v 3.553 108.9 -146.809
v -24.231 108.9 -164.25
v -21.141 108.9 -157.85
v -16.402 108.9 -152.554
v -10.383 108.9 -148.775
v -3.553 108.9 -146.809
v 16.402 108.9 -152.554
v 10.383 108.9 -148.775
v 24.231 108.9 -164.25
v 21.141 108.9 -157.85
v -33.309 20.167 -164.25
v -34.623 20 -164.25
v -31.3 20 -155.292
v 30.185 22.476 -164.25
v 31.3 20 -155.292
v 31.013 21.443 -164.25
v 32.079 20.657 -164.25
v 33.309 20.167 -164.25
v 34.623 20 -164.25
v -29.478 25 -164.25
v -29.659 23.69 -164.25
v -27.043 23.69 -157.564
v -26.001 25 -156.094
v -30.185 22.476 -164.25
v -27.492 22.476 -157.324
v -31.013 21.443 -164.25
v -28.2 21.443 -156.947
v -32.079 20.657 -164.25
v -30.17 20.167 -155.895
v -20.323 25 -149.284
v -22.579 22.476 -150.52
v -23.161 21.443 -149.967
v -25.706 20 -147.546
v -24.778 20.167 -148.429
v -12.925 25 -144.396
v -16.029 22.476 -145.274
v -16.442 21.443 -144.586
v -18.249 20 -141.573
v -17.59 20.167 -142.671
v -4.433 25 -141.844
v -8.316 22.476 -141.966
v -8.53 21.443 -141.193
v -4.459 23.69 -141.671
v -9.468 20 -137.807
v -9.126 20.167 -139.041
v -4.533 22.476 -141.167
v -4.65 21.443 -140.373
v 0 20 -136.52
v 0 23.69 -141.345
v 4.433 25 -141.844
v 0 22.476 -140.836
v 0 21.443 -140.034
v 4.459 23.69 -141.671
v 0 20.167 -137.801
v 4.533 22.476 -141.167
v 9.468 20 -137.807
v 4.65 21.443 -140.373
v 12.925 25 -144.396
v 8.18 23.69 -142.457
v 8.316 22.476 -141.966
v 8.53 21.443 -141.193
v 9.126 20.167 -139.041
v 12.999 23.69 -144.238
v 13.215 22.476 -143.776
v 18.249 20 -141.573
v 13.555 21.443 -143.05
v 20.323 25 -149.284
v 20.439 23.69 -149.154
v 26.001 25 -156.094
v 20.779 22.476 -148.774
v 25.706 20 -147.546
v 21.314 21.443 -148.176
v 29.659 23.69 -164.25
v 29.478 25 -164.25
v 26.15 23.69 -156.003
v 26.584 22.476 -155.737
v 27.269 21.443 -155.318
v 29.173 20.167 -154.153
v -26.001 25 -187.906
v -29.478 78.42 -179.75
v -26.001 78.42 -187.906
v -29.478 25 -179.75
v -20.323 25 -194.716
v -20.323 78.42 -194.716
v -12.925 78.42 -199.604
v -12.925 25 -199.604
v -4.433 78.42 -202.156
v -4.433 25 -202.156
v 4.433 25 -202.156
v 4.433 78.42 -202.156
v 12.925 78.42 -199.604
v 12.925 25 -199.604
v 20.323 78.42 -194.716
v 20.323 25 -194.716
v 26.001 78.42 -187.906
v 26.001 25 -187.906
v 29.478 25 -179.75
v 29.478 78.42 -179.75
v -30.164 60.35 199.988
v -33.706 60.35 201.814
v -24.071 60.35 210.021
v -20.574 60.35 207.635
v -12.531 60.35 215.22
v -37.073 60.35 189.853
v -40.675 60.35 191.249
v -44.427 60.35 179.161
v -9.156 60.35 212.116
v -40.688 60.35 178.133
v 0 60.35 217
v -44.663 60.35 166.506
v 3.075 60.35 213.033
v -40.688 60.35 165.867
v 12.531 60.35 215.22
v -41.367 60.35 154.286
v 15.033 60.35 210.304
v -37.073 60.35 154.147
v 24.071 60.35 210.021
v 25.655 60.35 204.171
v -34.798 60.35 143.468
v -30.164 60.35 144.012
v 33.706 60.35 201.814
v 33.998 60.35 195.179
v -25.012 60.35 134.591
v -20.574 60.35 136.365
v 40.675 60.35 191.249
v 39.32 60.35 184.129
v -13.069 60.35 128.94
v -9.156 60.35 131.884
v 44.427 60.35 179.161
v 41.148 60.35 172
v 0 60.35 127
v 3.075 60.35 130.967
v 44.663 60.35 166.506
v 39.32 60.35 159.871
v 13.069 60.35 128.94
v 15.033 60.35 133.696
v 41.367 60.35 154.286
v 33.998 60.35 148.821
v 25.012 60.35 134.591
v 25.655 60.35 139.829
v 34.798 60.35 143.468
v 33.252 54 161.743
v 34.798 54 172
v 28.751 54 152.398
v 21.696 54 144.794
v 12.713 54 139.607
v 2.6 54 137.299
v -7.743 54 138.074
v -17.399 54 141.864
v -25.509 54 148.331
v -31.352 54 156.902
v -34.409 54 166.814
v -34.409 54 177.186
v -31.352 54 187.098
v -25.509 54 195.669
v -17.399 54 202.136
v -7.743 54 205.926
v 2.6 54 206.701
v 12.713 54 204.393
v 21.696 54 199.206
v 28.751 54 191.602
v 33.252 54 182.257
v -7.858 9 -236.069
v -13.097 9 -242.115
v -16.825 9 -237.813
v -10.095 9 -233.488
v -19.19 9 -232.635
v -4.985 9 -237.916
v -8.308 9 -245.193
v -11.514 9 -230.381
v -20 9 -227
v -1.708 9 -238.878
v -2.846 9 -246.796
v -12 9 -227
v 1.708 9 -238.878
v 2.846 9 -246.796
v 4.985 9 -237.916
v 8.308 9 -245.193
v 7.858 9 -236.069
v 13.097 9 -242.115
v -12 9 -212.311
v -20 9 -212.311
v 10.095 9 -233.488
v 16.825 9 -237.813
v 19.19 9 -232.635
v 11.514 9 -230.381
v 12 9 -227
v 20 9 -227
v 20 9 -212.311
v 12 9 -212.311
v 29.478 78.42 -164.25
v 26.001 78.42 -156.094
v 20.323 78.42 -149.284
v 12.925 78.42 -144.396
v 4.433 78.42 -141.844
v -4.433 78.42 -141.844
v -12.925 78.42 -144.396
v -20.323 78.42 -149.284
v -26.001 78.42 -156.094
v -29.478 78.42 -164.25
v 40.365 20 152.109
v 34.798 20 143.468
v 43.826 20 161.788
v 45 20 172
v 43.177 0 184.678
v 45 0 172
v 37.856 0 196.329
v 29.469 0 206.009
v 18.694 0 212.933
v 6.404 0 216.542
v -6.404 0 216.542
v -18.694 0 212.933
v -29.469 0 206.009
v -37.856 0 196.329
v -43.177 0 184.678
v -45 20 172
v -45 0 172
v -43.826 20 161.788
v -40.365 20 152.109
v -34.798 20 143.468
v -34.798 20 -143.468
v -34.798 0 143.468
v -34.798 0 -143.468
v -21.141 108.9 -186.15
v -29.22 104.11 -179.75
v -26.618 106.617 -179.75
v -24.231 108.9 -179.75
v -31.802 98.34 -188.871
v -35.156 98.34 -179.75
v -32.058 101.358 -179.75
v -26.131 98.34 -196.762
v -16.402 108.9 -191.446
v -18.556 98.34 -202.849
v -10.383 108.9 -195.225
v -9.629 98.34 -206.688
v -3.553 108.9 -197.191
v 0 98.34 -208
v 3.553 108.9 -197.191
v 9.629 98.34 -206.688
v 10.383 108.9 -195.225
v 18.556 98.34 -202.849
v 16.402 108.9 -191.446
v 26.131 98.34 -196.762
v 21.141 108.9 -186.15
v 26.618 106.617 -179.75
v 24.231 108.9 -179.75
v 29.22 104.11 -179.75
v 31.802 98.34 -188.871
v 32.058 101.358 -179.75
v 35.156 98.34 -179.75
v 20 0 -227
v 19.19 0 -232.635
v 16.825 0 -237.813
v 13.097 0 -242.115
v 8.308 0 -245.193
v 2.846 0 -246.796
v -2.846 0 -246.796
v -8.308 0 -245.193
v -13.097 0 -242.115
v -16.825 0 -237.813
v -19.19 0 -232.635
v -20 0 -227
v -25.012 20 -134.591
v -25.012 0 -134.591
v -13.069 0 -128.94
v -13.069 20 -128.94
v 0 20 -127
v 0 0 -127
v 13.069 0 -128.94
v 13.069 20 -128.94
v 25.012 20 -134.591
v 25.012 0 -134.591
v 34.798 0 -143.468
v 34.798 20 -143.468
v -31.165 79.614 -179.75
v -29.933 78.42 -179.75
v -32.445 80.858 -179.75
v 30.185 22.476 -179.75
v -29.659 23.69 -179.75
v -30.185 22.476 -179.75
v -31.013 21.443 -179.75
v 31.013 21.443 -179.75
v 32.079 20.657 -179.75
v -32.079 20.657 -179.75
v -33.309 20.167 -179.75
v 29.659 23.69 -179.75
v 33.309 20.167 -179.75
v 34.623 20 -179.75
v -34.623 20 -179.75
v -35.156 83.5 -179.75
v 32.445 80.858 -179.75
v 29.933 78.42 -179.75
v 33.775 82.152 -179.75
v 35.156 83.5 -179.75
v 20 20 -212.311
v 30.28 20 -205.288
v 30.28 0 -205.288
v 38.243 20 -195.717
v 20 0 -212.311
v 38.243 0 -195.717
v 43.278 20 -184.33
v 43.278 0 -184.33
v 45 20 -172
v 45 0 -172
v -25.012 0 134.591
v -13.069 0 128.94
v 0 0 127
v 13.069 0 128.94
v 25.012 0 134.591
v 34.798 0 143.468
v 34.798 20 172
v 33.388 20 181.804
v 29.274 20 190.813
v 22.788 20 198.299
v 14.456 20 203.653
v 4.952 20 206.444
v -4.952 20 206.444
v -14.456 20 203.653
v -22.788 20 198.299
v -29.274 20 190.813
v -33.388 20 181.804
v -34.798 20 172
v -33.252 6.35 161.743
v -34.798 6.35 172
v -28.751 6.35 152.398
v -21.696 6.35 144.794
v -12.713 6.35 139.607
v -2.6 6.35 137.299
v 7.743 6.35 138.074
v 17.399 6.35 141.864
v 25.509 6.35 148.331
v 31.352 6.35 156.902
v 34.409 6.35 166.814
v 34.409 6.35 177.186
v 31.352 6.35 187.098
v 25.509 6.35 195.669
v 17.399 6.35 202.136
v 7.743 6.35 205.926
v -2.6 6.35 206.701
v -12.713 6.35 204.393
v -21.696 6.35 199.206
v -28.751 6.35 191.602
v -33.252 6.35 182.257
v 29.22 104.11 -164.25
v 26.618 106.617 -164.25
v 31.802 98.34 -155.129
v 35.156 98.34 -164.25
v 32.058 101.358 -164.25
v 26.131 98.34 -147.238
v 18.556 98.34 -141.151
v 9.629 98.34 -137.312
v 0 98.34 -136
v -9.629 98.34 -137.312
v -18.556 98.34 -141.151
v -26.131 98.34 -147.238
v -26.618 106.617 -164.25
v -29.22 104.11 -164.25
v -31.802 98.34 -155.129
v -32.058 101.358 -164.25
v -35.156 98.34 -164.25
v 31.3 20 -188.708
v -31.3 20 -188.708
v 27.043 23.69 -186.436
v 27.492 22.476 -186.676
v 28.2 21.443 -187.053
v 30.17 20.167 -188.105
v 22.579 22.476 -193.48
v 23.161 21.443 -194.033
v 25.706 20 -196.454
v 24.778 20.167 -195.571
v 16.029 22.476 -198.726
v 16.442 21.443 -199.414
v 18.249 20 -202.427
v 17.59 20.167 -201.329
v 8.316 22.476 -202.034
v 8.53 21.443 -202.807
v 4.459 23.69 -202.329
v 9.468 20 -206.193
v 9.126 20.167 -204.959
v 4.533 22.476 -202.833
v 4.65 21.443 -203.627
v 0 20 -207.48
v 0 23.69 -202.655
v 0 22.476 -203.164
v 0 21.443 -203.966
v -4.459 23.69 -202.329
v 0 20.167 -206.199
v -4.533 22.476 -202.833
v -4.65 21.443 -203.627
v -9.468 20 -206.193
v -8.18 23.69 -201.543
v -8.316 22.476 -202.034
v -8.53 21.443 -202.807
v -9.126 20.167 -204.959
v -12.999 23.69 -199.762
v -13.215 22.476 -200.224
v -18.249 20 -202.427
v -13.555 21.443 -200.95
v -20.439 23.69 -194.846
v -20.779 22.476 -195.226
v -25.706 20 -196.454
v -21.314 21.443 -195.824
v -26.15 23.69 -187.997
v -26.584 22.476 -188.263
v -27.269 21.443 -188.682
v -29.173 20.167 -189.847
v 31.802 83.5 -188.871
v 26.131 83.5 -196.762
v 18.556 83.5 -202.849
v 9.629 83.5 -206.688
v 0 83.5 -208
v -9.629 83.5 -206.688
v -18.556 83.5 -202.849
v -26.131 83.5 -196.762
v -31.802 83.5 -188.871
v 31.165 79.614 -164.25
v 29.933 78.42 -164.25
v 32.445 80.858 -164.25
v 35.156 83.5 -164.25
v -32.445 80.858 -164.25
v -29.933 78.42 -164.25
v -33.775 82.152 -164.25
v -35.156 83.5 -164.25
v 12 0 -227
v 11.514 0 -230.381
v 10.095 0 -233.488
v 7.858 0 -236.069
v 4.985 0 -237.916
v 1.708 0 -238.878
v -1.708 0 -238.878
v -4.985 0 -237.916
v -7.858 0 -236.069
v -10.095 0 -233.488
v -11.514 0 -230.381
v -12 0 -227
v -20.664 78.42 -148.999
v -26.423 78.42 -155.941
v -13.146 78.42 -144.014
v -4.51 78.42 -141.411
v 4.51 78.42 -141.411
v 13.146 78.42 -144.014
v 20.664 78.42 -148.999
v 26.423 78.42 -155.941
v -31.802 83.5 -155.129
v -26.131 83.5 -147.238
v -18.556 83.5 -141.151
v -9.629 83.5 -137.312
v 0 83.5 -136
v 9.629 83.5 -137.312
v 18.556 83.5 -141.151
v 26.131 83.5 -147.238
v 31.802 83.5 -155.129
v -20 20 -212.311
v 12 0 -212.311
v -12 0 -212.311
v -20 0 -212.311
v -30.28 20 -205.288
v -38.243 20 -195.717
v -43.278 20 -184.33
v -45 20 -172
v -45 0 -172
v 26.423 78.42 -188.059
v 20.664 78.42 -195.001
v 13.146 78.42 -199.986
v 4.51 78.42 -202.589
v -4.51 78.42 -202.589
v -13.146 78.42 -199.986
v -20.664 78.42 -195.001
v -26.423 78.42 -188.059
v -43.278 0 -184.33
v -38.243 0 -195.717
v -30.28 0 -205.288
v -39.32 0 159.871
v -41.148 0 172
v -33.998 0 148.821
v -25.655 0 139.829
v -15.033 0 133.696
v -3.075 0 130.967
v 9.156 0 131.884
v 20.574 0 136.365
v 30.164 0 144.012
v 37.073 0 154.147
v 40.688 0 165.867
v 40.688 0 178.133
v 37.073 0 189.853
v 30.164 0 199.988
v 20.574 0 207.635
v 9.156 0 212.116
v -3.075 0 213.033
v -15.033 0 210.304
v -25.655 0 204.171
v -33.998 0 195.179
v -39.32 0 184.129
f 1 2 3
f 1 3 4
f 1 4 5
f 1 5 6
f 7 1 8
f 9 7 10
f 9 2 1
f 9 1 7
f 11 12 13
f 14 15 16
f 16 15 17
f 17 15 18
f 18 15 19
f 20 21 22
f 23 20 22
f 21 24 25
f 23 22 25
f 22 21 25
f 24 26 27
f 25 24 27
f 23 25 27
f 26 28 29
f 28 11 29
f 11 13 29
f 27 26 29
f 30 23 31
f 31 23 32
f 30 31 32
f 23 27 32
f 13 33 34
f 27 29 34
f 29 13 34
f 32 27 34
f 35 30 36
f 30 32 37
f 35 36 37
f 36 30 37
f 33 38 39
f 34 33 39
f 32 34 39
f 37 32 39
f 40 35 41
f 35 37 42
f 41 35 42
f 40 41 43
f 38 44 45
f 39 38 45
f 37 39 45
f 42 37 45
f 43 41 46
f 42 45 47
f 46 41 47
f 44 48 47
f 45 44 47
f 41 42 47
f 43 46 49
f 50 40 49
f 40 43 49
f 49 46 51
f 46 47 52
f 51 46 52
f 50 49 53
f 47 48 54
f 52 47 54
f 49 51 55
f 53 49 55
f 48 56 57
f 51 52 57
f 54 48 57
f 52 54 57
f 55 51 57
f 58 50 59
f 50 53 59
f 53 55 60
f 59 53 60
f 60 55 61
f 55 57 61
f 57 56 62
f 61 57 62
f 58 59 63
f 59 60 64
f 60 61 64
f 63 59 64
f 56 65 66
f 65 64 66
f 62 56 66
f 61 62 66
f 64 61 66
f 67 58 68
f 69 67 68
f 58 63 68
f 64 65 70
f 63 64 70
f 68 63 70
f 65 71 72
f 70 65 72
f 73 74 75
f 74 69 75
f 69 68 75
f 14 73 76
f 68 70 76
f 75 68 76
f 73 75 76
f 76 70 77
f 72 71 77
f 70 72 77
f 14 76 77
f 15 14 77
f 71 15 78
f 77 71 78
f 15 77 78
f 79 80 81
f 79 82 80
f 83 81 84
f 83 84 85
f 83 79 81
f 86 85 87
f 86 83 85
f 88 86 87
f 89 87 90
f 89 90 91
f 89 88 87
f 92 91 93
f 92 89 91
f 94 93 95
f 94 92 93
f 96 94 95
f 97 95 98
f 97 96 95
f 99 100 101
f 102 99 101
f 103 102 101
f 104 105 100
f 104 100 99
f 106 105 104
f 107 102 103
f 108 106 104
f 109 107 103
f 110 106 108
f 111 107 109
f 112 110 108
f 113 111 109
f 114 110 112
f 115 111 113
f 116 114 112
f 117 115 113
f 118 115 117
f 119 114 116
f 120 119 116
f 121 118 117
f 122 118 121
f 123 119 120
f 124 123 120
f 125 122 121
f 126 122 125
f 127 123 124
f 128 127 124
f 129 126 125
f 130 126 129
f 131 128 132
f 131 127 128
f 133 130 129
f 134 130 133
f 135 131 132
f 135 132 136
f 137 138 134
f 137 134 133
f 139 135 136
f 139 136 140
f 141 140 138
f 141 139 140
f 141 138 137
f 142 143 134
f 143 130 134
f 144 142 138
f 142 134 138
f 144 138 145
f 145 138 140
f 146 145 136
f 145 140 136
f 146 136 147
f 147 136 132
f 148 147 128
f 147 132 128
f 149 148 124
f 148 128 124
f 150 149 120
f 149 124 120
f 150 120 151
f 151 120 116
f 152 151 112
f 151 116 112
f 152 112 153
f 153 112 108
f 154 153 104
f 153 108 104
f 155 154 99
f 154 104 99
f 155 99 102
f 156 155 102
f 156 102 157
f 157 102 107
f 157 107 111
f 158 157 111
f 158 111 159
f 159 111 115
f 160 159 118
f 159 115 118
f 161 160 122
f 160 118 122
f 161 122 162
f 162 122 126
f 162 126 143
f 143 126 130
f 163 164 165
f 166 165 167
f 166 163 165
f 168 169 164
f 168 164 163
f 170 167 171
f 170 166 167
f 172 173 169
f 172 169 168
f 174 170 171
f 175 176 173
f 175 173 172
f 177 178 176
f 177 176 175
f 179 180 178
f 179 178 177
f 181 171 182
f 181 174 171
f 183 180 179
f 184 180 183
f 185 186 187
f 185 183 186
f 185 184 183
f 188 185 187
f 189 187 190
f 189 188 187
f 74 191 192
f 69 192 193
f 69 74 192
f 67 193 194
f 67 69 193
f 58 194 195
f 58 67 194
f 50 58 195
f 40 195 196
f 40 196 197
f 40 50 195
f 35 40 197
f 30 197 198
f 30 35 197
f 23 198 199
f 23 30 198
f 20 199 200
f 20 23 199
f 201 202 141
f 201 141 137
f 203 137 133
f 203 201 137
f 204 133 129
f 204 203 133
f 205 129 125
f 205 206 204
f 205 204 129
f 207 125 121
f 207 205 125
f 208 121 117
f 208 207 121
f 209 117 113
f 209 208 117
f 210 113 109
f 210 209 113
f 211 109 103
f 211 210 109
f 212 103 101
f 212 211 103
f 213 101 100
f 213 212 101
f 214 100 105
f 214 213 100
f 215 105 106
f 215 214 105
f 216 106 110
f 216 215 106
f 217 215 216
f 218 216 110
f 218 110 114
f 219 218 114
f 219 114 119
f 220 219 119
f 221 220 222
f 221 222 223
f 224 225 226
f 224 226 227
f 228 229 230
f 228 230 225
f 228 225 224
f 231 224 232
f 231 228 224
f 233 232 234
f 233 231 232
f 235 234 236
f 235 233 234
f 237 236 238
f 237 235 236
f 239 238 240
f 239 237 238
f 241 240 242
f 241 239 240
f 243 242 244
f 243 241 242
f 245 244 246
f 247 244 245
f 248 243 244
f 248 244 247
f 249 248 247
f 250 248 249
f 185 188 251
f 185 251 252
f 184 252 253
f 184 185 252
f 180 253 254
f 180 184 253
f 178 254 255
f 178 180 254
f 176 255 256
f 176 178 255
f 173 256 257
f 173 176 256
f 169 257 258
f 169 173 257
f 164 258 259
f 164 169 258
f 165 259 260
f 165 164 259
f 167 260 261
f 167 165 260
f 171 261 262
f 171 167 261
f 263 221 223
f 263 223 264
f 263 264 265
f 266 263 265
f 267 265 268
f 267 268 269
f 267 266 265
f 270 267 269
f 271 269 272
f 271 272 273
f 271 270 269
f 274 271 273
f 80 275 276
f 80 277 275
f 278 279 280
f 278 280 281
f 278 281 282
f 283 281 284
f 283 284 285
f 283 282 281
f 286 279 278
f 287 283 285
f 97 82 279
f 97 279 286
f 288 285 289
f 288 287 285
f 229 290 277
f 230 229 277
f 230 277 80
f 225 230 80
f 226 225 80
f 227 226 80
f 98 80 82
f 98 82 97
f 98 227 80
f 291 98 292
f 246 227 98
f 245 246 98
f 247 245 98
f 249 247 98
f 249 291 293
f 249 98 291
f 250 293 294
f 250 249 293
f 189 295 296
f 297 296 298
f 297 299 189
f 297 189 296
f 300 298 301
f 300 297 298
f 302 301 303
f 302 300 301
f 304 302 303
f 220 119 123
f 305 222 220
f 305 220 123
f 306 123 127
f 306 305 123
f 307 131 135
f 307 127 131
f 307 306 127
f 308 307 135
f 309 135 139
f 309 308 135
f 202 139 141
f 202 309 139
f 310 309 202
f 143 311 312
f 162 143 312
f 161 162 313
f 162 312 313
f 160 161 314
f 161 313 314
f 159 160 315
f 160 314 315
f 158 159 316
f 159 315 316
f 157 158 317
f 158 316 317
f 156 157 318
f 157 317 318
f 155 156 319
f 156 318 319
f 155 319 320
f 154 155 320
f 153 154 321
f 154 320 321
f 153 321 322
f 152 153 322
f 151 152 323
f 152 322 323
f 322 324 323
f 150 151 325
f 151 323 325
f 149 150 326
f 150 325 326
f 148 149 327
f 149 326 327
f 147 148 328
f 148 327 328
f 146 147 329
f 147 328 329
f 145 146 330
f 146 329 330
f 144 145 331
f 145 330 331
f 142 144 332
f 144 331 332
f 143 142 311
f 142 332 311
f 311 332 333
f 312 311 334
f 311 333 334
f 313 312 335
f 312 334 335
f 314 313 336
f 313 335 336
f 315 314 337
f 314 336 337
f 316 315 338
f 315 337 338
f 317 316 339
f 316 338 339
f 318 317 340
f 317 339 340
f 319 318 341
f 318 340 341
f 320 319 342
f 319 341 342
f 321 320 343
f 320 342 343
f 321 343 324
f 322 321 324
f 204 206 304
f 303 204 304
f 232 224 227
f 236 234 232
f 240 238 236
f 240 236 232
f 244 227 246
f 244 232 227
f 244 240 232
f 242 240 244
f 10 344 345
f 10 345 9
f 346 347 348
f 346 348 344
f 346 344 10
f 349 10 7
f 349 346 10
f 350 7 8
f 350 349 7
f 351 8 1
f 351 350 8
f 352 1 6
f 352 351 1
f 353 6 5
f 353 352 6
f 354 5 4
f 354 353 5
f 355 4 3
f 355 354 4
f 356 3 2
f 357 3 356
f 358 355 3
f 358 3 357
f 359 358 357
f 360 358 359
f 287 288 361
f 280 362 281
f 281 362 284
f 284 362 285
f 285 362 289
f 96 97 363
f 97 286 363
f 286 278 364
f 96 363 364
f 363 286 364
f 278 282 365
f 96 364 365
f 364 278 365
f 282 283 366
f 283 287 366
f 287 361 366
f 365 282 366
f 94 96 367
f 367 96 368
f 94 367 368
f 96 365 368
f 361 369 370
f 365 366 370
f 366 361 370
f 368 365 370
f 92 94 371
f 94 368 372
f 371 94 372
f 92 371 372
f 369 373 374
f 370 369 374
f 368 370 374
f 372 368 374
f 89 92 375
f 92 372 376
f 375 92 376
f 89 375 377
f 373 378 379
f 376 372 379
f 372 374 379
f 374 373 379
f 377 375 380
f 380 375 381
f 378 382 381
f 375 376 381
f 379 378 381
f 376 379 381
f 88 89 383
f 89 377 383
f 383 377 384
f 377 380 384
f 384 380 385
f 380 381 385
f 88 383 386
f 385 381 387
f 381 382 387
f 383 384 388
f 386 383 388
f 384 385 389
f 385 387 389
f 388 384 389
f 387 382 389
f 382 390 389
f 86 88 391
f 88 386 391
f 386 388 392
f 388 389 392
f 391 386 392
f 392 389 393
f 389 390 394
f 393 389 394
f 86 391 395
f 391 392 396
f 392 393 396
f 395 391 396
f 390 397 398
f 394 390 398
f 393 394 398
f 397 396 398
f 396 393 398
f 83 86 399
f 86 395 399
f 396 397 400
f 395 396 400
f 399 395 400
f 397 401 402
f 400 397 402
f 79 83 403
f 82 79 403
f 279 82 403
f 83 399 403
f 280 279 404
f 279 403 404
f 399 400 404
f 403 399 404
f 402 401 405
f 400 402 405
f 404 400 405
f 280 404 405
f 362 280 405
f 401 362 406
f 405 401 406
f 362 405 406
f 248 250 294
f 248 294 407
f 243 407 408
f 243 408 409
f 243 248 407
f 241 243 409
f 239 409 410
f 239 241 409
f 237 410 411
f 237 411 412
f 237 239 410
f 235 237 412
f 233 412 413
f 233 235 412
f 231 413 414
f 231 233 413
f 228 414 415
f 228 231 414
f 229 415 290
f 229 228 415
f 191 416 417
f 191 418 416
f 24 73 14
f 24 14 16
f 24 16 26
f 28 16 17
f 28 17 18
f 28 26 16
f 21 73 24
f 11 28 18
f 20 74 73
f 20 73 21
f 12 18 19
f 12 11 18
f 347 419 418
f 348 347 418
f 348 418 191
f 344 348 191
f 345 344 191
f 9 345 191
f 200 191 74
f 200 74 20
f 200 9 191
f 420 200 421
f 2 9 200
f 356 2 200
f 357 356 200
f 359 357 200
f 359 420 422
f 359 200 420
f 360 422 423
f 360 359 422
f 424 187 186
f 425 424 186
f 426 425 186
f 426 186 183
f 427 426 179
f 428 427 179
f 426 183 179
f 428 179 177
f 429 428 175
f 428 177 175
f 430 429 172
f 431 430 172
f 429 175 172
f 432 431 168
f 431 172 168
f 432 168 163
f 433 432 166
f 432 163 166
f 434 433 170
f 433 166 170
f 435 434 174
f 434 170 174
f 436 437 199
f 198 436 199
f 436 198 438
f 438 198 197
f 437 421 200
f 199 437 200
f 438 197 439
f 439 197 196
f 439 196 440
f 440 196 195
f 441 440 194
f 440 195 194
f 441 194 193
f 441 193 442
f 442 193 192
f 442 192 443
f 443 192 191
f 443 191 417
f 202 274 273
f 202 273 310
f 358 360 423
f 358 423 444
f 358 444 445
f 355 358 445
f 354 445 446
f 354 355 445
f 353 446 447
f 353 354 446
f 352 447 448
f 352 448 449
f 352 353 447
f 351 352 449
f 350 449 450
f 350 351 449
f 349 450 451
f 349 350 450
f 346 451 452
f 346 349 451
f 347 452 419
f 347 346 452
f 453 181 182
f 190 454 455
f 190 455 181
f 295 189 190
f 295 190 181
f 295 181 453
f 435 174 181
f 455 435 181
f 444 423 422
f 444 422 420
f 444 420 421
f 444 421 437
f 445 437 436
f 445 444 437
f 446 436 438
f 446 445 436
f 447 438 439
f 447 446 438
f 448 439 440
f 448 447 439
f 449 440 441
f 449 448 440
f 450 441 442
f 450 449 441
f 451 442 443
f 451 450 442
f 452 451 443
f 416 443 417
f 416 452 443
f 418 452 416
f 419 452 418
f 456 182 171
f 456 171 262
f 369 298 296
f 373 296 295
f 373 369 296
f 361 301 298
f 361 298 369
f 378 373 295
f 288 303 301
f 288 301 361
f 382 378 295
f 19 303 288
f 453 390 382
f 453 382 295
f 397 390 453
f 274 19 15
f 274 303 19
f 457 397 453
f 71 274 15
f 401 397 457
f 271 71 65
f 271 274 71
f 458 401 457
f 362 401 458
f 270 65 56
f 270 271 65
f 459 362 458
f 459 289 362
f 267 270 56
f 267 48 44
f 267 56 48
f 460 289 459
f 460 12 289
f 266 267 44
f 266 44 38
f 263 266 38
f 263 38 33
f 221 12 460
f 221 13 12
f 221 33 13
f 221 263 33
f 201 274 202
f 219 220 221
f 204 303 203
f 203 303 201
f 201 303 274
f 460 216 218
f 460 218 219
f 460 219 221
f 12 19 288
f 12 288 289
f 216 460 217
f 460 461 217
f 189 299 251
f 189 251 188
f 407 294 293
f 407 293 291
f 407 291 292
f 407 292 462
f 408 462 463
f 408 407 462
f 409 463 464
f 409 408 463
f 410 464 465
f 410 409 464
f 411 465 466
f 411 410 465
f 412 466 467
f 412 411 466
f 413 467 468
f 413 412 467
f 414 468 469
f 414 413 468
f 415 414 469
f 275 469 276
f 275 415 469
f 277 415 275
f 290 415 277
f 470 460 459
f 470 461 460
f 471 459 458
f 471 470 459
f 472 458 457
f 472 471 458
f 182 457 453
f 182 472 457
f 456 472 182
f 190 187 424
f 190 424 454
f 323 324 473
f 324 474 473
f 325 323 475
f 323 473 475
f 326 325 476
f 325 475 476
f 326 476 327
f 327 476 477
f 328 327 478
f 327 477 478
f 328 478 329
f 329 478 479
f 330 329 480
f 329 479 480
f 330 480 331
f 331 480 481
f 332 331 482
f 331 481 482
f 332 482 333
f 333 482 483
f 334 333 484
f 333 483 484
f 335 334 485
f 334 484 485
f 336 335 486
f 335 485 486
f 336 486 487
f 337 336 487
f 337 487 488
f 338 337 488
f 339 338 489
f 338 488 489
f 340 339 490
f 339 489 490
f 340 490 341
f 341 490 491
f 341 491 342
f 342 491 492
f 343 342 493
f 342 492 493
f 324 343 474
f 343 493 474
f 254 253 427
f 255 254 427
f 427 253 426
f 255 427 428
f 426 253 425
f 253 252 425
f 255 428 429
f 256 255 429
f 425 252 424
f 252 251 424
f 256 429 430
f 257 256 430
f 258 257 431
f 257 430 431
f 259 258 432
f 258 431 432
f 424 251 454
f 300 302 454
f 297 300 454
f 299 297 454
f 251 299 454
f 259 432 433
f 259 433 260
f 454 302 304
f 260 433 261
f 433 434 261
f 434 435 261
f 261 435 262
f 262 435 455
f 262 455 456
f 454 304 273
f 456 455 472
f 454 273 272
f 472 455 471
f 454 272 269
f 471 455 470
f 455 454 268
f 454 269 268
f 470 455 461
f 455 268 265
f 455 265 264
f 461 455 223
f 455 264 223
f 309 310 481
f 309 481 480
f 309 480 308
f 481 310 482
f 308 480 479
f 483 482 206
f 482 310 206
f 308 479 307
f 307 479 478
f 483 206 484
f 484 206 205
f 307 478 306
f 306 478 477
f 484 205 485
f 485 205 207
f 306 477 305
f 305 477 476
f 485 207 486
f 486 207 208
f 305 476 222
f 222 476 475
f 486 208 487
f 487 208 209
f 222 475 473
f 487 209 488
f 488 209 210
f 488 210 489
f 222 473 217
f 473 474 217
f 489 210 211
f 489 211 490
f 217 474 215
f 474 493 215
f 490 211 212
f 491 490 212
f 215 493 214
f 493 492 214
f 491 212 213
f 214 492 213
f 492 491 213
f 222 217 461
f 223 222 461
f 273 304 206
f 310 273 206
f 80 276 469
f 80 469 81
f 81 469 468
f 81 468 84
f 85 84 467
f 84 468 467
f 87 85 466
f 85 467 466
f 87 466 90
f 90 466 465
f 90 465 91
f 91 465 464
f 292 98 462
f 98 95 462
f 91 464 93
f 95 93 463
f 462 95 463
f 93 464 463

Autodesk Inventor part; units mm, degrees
ref_plane "YZ Plane" through (0, 0, 0) normal (1, 0, 0) x (0, 1, 0)
ref_plane "XZ Plane" through (0, 0, 0) normal (0, 1, 0) x (-1, 0, 0)
ref_plane "XY Plane" through (0, 0, 0) normal (0, 0, 1) x (1, 0, 0)
sketch "Boceto1" plane through (0, 0, 0) normal (0, 1, 0) x (-1, 0, 0)
  line L0 (45, 172) -> (-45, 172)
  line L1 (-45, 172) -> (-45, -172)
  line L2 (-45, -172) -> (45, -172)
  line L3 (45, -172) -> (45, 172)
  line L4 (45, 172) -> (-45, -172) construction
  line L5 (-45, 172) -> (45, -172) construction
  circle A0 centre (0, -172) radius 45
  circle A1 centre (0, 172) radius 45
  circle A2 centre (0, 172) radius 34.798
  line L6 (45, 172) -> (-45, 172)
  point P0 (0, 0)
  dimension "d0" = 90
  dimension "d1" = 344
  dimension "d2" = 90
  dimension "d3" = 90
  dimension "d4" = 69.596
extrude "Extrusión1" add sketch "Boceto1" along normal blind 20 contours A1 L0 A2 | L0 A2 A1 | L3 A0 L1 A1 | A2 L0 | A0 L2 | L2 A0 picked at (9.4719, 153.1181)
sketch "Boceto3" plane through (0, 20, 0) normal (0, 1, 0) x (1, 0, 0)
  line L0 (34.798, -172) -> (-34.798, -172) projected
  circle A0 centre (0, -172) radius 34.798
  point P0 (0, 0)
extrude "Extrusión2" cut sketch "Boceto3" against normal blind 20
sketch "Boceto5" plane through (0, 20, 0) normal (0, 1, 0) x (1, 0, 0)
  circle A0 centre (0, -172) radius 34.798 projected
  line L0 (-45, 172) -> (-45, -172) projected
  arc A1 (-45, -172) -> (45, -172) centre (0, -172) ccw projected
  line L1 (45, -172) -> (45, 172) projected
  arc A2 (45, 172) -> (-45, 172) centre (0, 172) ccw projected
  line L2 (34.798, -172) -> (-34.798, 172) construction
  line L3 (-34.798, -172) -> (34.798, 172) construction
  line L4 (-45, 172) -> (-45, -172) projected
  arc A3 (34.798, -143.4676) -> (-34.798, -143.4676) centre (0, -172) ccw
  arc A4 (-34.798, 143.4676) -> (34.798, 143.4676) centre (0, 172) ccw
  line L5 (-34.798, -143.4676) -> (-34.798, 143.4676)
  line L6 (34.798, 143.4676) -> (34.798, -143.4676)
  line L7 (45, -172) -> (45, 172) projected
  point P0 (0, 0)
extrude "Extrusión3" cut sketch "Boceto5" against normal blind 20 contours A3 L5 A4 L6
sketch "Boceto6" plane through (0, 20, 0) normal (0, 1, 0) x (1, 0, 0)
  circle A0 centre (0, -172) radius 34.798 projected
  arc A1 (34.798, -143.4676) -> (-34.798, -143.4676) centre (0, -172) ccw projected
  arc A2 (-45, -172) -> (45, -172) centre (0, -172) ccw projected
  arc A3 (-34.798, 143.4676) -> (34.798, 143.4676) centre (0, 172) ccw projected
  circle A4 centre (0, -172) radius 34.798
  circle A5 centre (0, -172) radius 45
  circle A6 centre (0, 172) radius 45
  point P0 (0, 0)
extrude "Extrusión4" add sketch "Boceto6" along normal blind 40.35 contours A5 A2 A1
chamfer "Chaflán1" distance 6.35 angle 45 2 edges at (-34.798, 60.35, 172) (34.798, 0, 172)
sketch "Boceto7" plane through (0, 20, 0) normal (0, 1, 0) x (1, 0, 0)
  arc A0 (-34.798, -143.4676) -> (-45, -172) centre (0, -172) ccw projected
  line L0 (-34.798, -143.4676) -> (-34.798, 143.4676) projected
  arc A1 (-34.798, 143.4676) -> (34.798, 143.4676) centre (0, 172) ccw projected
  line L1 (34.798, 143.4676) -> (34.798, -143.4676) projected
  arc A2 (45, -172) -> (34.798, -143.4676) centre (0, -172) ccw projected
  line L2 (45, -172) -> (45, 172) projected
  arc A3 (45, 172) -> (-45, 172) centre (0, 172) ccw projected
  line L3 (-45, 172) -> (-45, -172) projected
  circle A4 centre (0, 172) radius 30.48
  point P0 (0, 0)
  dimension "d16" = 60.96
extrude "Extrusión5" add sketch "Boceto7" along normal blind 88.9 contours A4
sketch "Boceto9" plane through (0, 108.9, -172) normal (0, 1, 0) x (1, 0, 0)
  circle A0 centre (0, 0) radius 36
  point P0 (0, -172)
  dimension "d20" = 72
extrude "Extrusión6" add sketch "Boceto9" against normal blind 30.48
chamfer "Chaflán2" distance 10.56 angle 45 1 edges at (-36, 108.9, -172)
chamfer "Chaflán3" distance 5.08 angle 45 1 edges at (-36, 78.42, -172)
fillet "Empalme1" radius 5 1 edges at (-30.48, 20, -172)
sketch "Boceto10" plane through (0, 108.9, -172) normal (0, 1, 0) x (1, 0, 0)
  circle A0 centre (0, 0) radius 25.44 projected
  arc A1 (45, 0) -> (-45, 0) centre (0, 0) ccw projected
  line L0 (44.3276, -7.75) -> (-44.3276, -7.75)
  line L1 (-44.3276, -7.75) -> (-44.3276, 7.75)
  line L2 (-44.3276, 7.75) -> (44.3276, 7.75)
  line L3 (44.3276, 7.75) -> (44.3276, -7.75)
  line L4 (44.3276, -7.75) -> (-44.3276, 7.75) construction
  line L5 (-44.3276, -7.75) -> (44.3276, 7.75) construction
  point P0 (0, -172)
  dimension "d30" = 15.5
extrude "Extrusión7" cut sketch "Boceto10" against normal blind 88.9 contours A0 L0 L2 | A0 L2 L3 L0 | A0 L0 L1 L2
ref_plane "Plano de trabajo1" through (0, 0, -217) normal (0, 0, -1) x (-1, 0, 0)
sketch "Boceto11" plane through (0, 0, -217) normal (0, 0, -1) x (-1, 0, 0)
  line L0 (45, 0) -> (45, 20) projected
  line L1 (-45, 20) -> (45, 20) projected
  line L2 (-45, 20) -> (-45, 0) projected
  line L3 (-45, 0) -> (45, 0) projected
  line L4 (45, 0) -> (-45, 0) projected
  line L5 (-20, 20) -> (20, 20)
  line L6 (20, 20) -> (20, 0)
  line L7 (20, 0) -> (-20, 0)
  line L8 (-20, 0) -> (-20, 20)
  line L9 (-20, 20) -> (20, 0) construction
  line L10 (20, 20) -> (-20, 0) construction
  point P0 (0, 0)
  point P1 (0, 10)
extrude "Extrusión8" add sketch "Boceto11" along normal blind 30 and the other way blind 10 contours L3 L8 L1 L6
sketch "Boceto15" plane through (0, 20, 0) normal (0, 1, 0) x (1, 0, 0)
  arc A0 (-20, 212.3113) -> (-45, 172) centre (0, 172) ccw projected
  line L0 (-45, 172) -> (-45, -172) projected
  arc A1 (-34.798, -143.4676) -> (-45, -172) centre (0, -172) ccw projected
  line L1 (-34.798, -143.4676) -> (-34.798, 143.4676) projected
  arc A2 (-34.798, 143.4676) -> (34.798, 143.4676) centre (0, 172) ccw projected
  line L2 (34.798, 143.4676) -> (34.798, -143.4676) projected
  arc A3 (45, -172) -> (34.798, -143.4676) centre (0, -172) ccw projected
  line L3 (45, -172) -> (45, 172) projected
  arc A4 (45, 172) -> (20, 212.3113) centre (0, 172) ccw projected
  line L4 (20, 212.3113) -> (20, 247) projected
  line L5 (-20, 247) -> (20, 247) projected
  line L6 (-20, 212.3113) -> (-20, 247) projected
  arc A5 (34.6232, 179.75) -> (-34.6232, 179.75) centre (0, 172) ccw projected
  line L7 (-34.6232, 179.75) -> (34.6232, 179.75) projected
  line L8 (34.6232, 164.25) -> (-34.6232, 164.25) projected
  arc A6 (-34.6232, 164.25) -> (34.6232, 164.25) centre (0, 172) ccw projected
  arc A7 (12, 227) -> (-12, 227) centre (0, 227) ccw
  line L9 (12, 227) -> (12, 212.3113)
  line L10 (-12, 227) -> (-12, 212.3113)
  arc A8 (45, 172) -> (20, 212.3113) centre (0, 172) ccw projected
  line L11 (-20, 227) -> (-20, 247)
  line L12 (20, 247) -> (-20, 247) projected
  line L13 (-20, 247) -> (20, 247)
  line L14 (20, 247) -> (20, 227)
  line L15 (-12, 212.3113) -> (12, 212.3113)
  line L16 (-20, 227) -> (-20, 247)
  line L17 (20, 247) -> (0, 247)
  line L18 (-20, 247) -> (0, 247)
  line L19 (-20, 247) -> (-20, 227)
  arc A9 (20, 227) -> (0, 247) centre (0, 227) ccw
  arc A10 (0, 247) -> (-20, 227) centre (0, 227) ccw
  line L20 (20, 212.3113) -> (20, 247) projected
  line L21 (20, 227) -> (20, 247)
  line L22 (20, 247) -> (0, 247)
  point P0 (0, 0)
extrude "Extrusión11" cut sketch "Boceto15" against normal blind 50 contours L6 L5 A10 | L5 L4 A9 | L9 L15 L10 A7
sketch "Boceto16" plane through (20, 0, -212.3113) normal (1, 0, 0) x (0, 0, -1)
  line L0 (14.6887, 0) -> (14.6887, 20) projected
  line L1 (0, 20) -> (14.6887, 20) projected
  line L2 (0, 0) -> (0, 20) projected
  line L3 (0, 0) -> (14.6887, 0) projected
  line L4 (0, 20) -> (38, 20)
  line L5 (38, 20) -> (38, 9)
  line L6 (38, 9) -> (0, 9)
  line L7 (0, 9) -> (0, 20)
  point P0 (-212.3113, 0)
extrude "Extrusión12" cut sketch "Boceto16" against normal blind 50 contours L6 L2 L1 L0 | L0 L4 L5 L6
properties part number "link_v2ipt"
